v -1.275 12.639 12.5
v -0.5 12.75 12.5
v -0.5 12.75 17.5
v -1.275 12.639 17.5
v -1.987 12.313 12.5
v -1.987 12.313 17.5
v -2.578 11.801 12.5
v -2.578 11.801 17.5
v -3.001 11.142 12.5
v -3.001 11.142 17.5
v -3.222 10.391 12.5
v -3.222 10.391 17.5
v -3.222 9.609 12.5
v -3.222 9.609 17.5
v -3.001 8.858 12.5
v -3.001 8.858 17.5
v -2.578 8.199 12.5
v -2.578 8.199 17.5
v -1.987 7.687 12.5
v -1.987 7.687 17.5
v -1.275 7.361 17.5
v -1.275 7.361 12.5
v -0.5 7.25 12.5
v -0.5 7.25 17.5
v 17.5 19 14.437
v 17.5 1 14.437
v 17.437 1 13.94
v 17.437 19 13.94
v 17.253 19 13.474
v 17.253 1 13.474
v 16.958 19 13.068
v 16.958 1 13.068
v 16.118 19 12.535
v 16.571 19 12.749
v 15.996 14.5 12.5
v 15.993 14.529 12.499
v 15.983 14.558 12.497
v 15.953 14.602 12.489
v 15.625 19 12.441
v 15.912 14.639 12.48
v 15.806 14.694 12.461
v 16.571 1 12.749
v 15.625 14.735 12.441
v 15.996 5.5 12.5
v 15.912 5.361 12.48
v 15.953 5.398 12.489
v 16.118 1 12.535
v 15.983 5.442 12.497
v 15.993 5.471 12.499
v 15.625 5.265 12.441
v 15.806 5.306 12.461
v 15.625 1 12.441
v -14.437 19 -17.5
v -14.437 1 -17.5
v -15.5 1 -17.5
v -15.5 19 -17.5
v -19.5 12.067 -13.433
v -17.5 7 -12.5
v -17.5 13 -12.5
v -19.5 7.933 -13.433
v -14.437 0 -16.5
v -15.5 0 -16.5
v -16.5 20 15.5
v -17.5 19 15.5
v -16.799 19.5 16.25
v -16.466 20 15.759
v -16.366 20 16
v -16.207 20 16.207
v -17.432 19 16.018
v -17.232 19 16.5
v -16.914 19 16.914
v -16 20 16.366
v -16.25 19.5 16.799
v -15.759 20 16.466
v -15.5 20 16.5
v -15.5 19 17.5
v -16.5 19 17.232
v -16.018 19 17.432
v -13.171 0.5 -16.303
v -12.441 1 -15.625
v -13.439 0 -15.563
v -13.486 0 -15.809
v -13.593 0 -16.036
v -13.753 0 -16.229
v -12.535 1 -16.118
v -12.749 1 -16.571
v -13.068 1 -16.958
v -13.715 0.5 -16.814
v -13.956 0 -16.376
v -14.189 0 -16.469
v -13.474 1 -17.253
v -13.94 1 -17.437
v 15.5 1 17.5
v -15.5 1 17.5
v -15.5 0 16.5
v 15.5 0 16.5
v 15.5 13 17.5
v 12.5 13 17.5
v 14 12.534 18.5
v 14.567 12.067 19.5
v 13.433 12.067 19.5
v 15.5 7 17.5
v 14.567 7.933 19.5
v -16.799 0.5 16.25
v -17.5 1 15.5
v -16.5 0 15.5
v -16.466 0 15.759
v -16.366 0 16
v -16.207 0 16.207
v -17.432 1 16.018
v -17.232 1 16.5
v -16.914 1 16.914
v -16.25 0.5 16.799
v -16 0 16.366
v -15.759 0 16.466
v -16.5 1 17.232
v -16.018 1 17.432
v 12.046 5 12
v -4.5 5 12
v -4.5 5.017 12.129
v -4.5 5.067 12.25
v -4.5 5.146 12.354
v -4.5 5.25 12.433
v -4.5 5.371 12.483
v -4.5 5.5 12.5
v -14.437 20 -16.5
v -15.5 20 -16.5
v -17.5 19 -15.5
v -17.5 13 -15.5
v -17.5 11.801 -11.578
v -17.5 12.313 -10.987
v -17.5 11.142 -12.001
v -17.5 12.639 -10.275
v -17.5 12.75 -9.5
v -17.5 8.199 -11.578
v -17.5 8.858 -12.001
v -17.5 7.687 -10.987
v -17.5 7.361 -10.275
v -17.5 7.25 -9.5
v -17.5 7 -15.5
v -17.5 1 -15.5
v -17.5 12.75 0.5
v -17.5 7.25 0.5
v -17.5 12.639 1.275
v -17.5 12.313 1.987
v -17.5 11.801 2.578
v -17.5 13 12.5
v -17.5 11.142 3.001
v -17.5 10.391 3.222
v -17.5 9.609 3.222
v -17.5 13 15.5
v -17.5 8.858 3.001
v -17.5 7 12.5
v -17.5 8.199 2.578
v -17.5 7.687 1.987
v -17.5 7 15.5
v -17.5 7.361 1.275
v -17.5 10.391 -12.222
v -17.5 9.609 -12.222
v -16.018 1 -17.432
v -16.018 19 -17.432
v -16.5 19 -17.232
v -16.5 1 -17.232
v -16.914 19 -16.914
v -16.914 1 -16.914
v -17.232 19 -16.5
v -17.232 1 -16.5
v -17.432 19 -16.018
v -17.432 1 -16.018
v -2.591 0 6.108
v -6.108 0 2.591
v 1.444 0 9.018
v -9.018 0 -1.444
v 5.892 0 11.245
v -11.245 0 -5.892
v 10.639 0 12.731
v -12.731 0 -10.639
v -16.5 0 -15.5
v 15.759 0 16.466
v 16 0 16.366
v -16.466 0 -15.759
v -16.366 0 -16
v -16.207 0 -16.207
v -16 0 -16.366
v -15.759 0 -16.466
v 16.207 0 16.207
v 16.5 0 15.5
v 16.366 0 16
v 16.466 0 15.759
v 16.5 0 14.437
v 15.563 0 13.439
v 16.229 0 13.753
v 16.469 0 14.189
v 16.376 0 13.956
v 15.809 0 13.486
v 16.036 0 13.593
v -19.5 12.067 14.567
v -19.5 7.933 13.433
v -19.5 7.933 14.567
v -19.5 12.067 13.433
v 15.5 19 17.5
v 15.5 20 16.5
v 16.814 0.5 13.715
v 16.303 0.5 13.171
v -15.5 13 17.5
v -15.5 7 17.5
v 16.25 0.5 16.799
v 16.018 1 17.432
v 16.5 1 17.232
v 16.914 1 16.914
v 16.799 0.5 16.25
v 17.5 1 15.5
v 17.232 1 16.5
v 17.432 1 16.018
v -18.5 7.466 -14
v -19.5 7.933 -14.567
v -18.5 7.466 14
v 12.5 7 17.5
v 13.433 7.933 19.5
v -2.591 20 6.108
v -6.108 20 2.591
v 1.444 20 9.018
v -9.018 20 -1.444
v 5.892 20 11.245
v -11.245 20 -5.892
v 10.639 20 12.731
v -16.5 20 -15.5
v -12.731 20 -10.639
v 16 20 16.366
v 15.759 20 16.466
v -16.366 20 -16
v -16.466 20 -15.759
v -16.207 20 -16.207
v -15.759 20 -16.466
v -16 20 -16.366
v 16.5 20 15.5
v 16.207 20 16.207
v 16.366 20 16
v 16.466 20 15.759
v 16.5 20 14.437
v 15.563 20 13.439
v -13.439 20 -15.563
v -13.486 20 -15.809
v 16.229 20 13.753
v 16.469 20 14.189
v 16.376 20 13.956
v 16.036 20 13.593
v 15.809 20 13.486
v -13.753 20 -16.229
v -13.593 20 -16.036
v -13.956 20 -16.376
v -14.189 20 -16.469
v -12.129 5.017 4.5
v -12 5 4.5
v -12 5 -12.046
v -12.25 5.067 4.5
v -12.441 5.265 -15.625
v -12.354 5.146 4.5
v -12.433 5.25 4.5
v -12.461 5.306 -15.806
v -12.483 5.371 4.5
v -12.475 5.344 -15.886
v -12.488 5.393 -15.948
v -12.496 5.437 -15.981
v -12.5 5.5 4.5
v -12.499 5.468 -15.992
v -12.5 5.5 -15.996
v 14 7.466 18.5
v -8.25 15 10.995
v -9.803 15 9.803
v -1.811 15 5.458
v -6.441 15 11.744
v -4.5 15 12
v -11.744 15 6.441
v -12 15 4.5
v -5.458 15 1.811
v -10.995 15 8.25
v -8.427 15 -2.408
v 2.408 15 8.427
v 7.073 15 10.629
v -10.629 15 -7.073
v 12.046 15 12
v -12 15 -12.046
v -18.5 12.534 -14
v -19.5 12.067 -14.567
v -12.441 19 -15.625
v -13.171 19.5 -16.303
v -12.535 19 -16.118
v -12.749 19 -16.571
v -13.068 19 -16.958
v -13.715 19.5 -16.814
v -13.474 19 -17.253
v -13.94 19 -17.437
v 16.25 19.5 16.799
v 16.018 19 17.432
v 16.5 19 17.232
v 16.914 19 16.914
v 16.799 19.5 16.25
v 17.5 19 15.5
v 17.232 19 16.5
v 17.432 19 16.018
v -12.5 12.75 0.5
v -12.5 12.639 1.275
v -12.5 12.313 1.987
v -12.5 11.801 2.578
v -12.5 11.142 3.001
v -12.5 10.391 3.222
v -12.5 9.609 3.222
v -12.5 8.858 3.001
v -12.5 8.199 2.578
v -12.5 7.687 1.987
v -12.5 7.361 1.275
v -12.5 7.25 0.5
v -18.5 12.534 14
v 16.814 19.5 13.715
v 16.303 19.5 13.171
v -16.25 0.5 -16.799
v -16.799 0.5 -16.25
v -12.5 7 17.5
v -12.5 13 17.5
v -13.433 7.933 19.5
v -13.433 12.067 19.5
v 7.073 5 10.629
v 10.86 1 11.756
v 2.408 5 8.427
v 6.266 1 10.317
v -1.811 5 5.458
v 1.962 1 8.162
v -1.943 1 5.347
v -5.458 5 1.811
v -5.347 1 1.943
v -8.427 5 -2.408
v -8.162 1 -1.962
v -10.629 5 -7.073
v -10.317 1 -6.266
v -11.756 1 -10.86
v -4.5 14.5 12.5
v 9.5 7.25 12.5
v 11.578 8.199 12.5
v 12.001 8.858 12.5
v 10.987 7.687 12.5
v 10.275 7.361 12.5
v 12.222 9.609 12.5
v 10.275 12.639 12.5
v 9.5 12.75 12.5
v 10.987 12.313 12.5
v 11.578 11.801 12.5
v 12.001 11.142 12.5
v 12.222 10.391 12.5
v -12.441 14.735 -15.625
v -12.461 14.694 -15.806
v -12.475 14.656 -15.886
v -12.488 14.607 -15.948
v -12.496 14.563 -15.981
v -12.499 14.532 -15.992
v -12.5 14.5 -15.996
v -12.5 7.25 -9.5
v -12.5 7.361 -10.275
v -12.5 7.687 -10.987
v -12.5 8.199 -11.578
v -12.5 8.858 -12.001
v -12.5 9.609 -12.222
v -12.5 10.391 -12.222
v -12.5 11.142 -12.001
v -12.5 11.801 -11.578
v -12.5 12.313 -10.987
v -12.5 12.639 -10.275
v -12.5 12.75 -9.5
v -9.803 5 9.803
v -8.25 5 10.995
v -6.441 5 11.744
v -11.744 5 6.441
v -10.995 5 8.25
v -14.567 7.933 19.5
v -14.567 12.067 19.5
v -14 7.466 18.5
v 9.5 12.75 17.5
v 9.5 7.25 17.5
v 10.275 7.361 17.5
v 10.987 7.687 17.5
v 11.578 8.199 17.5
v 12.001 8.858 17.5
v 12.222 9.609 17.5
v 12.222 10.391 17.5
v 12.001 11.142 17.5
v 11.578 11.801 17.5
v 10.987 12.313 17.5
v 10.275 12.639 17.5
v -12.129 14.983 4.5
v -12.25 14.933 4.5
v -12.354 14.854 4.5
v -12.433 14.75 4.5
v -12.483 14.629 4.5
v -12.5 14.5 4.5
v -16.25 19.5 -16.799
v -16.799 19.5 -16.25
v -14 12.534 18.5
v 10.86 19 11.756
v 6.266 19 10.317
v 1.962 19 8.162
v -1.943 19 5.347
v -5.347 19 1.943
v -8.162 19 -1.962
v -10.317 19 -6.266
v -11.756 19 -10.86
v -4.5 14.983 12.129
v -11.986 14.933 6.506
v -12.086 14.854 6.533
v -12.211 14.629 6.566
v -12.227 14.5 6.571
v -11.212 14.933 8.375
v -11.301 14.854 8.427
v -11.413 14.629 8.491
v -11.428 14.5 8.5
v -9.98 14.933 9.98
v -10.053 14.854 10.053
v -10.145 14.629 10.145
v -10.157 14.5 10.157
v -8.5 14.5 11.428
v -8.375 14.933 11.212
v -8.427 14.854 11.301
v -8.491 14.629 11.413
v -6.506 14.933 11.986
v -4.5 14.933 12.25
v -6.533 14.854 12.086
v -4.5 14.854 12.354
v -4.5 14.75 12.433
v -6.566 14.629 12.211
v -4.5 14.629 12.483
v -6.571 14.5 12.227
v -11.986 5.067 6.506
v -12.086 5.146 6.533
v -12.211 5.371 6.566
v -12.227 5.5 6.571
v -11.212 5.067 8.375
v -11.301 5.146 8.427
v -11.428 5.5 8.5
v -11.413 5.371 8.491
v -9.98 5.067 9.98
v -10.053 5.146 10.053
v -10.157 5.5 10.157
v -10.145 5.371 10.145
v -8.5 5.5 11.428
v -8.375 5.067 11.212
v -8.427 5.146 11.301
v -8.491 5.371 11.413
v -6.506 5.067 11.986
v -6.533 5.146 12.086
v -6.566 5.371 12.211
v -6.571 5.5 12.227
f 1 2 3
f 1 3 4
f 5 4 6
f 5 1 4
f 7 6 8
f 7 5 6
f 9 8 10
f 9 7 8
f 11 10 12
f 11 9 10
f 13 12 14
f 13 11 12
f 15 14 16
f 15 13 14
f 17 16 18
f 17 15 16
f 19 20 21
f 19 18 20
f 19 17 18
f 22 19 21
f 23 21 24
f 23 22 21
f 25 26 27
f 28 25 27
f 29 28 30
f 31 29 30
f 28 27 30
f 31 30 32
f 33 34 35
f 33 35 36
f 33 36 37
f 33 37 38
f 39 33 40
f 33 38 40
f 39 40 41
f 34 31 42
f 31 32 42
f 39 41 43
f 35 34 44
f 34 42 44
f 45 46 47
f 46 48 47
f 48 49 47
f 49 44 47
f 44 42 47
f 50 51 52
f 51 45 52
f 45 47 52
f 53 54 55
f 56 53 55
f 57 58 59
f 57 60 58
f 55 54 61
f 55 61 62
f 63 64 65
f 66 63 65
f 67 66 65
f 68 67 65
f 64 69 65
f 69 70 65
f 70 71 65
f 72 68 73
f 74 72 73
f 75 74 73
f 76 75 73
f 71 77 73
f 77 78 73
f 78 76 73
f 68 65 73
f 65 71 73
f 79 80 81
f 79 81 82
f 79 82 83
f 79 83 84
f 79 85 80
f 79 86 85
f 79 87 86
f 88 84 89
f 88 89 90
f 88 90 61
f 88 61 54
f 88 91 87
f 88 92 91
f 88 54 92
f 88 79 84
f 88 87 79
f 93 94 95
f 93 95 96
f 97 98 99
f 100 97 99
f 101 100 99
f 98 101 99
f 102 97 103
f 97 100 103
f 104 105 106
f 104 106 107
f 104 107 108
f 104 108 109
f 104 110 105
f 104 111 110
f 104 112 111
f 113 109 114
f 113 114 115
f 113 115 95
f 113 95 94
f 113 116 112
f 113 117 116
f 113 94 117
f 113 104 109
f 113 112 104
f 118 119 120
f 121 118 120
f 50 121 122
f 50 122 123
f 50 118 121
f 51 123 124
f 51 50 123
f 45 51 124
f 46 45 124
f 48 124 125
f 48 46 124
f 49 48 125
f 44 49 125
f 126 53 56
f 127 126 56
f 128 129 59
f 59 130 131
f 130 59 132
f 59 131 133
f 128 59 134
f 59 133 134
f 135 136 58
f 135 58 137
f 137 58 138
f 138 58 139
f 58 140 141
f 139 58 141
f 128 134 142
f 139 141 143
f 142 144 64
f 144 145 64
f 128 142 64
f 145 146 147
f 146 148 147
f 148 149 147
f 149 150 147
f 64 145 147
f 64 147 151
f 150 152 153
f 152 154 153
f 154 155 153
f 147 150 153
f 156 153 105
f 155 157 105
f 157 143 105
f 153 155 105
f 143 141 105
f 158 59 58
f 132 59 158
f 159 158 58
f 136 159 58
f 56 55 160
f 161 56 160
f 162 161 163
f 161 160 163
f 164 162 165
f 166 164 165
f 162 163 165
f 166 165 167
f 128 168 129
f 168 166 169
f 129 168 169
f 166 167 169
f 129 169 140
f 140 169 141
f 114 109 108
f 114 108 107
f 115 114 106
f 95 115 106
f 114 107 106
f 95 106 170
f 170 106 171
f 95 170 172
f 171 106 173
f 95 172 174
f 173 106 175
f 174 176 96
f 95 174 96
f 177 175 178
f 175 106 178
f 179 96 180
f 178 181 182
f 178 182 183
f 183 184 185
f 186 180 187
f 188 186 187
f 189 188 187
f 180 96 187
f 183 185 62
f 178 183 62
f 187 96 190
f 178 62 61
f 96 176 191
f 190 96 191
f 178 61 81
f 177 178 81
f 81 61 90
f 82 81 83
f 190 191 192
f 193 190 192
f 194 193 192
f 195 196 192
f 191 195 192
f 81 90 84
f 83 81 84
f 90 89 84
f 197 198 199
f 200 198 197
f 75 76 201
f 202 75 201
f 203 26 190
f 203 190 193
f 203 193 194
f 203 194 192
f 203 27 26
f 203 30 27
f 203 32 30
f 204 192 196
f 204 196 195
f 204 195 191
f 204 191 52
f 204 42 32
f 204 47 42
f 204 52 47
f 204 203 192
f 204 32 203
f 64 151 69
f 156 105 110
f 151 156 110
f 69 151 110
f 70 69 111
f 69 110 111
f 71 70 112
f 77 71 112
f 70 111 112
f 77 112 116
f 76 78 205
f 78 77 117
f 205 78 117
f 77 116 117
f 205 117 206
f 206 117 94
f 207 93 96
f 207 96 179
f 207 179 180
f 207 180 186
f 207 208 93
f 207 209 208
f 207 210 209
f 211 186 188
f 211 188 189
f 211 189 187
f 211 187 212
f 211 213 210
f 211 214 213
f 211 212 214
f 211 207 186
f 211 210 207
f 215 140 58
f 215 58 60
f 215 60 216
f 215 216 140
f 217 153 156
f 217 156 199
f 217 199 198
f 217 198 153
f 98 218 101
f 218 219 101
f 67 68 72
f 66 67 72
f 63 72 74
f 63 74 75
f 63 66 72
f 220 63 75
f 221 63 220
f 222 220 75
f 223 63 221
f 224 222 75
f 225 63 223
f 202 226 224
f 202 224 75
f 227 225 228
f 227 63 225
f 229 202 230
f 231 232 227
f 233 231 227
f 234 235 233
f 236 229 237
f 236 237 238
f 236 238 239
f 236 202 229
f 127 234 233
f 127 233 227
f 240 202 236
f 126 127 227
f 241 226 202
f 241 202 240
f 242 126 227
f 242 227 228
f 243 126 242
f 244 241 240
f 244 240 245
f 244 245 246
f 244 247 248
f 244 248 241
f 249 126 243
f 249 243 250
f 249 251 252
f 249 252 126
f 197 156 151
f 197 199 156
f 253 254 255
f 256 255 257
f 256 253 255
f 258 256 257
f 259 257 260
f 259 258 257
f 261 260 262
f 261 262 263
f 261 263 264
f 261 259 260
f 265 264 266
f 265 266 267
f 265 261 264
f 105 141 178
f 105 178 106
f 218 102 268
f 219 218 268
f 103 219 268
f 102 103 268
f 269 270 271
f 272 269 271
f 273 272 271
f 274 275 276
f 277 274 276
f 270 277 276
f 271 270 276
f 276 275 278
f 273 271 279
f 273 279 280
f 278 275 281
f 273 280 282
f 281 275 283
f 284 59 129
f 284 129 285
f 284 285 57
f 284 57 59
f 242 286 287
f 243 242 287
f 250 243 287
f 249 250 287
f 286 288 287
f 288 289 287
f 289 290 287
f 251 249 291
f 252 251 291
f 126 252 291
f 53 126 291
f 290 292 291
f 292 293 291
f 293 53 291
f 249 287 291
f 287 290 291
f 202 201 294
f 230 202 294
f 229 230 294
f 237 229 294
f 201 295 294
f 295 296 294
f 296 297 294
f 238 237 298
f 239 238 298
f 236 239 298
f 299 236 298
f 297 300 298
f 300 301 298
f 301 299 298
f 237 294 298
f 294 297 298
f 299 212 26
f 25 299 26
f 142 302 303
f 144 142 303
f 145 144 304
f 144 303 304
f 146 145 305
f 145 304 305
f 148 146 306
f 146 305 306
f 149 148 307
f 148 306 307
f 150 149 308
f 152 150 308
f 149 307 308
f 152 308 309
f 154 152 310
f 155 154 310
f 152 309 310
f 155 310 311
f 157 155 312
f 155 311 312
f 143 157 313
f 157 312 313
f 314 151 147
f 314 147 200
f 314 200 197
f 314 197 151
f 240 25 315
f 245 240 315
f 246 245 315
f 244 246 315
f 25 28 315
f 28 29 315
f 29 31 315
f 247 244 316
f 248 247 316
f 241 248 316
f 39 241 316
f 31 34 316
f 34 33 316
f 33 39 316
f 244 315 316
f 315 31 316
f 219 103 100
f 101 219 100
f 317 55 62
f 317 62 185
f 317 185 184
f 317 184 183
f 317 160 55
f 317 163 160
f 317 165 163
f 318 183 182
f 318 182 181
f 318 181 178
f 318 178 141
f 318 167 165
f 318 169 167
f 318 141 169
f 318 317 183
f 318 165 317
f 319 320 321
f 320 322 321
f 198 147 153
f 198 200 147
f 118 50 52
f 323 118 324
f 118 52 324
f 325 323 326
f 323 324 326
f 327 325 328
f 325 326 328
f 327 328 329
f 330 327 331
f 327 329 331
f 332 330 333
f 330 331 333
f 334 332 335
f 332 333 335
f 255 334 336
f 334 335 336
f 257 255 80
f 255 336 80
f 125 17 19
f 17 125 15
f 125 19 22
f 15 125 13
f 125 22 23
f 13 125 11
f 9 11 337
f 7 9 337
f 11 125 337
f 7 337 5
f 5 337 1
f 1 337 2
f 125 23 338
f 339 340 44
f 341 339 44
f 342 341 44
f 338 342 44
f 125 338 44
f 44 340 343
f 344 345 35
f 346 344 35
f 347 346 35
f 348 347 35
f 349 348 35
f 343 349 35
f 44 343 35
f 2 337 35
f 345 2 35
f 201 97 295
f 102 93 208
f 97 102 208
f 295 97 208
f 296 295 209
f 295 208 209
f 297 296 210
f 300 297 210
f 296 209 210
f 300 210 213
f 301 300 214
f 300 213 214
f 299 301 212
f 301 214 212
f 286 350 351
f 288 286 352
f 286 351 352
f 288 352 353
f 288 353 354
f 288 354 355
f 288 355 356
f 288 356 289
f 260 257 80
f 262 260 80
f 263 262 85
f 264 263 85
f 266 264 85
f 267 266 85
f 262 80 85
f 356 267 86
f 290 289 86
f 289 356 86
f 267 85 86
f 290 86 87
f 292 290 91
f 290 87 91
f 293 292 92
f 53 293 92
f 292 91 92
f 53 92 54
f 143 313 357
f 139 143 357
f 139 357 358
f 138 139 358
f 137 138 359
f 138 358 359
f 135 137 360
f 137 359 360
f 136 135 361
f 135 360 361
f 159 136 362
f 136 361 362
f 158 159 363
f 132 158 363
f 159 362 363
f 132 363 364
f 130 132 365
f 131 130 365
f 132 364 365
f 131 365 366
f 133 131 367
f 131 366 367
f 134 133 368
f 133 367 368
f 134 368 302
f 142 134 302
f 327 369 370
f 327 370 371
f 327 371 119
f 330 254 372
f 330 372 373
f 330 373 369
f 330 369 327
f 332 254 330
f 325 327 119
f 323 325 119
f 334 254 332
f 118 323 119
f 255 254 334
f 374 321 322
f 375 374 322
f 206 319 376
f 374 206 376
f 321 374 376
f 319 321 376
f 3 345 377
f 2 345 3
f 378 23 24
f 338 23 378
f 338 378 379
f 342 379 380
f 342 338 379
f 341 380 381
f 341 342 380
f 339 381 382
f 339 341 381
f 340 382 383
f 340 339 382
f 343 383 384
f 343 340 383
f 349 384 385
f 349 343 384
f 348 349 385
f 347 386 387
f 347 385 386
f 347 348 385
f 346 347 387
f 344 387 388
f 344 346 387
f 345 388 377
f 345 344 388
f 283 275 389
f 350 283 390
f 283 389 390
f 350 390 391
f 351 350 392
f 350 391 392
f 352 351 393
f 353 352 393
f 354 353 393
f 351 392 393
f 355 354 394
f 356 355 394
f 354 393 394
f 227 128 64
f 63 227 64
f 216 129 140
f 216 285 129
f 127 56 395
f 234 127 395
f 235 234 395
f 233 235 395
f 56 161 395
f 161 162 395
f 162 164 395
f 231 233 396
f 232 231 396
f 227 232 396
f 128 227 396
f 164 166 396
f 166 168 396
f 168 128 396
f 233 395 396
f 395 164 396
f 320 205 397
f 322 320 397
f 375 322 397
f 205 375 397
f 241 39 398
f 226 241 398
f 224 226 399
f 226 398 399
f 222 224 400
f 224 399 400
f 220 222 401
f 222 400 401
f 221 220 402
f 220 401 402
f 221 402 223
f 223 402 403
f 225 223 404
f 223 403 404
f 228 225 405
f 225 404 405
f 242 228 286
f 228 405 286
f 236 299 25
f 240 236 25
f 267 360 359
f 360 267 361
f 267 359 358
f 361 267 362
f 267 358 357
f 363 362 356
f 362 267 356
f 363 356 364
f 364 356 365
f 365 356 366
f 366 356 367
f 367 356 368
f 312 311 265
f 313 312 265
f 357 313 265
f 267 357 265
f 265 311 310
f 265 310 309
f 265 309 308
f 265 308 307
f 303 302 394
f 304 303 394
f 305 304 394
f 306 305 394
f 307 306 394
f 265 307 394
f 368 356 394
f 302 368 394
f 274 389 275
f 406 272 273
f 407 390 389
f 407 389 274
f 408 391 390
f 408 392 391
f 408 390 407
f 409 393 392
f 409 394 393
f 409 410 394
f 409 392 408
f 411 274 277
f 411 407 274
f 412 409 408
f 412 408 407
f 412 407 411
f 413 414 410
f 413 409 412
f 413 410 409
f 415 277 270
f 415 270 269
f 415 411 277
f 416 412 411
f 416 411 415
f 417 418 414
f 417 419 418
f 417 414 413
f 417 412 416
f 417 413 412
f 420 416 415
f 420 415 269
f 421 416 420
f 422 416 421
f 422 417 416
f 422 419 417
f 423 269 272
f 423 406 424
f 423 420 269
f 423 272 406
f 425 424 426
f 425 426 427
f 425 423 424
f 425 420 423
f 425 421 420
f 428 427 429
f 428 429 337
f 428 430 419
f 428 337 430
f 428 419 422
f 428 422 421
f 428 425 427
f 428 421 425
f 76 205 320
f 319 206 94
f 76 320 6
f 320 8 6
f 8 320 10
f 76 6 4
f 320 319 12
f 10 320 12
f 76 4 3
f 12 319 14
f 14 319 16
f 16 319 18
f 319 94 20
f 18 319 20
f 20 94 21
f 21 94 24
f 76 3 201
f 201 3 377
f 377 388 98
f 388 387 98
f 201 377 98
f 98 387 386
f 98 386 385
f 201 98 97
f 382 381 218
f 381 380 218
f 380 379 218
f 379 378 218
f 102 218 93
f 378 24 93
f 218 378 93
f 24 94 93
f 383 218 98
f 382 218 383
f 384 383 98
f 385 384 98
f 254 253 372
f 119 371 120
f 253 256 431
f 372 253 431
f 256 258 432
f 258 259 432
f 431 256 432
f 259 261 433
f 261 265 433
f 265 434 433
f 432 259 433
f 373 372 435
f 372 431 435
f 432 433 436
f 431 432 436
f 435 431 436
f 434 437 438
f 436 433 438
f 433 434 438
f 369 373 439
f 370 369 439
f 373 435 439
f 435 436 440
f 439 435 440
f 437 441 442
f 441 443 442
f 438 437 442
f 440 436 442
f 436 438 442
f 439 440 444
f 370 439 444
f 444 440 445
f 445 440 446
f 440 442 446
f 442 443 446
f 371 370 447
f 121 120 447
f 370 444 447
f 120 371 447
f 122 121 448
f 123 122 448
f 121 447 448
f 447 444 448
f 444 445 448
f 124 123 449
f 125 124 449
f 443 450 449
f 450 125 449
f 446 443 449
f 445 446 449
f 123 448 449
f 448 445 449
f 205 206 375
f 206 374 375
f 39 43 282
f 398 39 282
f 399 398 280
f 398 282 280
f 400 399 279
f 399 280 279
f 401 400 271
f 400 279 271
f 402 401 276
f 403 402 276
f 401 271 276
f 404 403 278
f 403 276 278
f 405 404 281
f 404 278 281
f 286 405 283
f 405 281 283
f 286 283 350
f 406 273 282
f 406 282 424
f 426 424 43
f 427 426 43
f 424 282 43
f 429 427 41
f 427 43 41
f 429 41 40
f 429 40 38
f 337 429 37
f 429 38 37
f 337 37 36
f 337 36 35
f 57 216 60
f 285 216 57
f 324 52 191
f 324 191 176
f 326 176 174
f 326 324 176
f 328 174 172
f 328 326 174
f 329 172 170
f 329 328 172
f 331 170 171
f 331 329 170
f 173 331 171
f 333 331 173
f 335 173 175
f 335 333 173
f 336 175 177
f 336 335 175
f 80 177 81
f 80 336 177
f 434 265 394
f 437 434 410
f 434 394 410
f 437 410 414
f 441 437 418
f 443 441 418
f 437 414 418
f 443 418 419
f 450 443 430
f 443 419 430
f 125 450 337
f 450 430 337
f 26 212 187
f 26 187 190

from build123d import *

# Parameters (mm, degrees)
BOSS_EXTRUDE1_DEPTH = 20
CUT_EXTRUDE2_START  = -10
CUT_EXTRUDE2_DEPTH  = 5
CUT_EXTRUDE1_START  = -36
CUT_EXTRUDE1_DEPTH  = 37
SKETCH5_W           = 3
SKETCH5_H           = 6
BOSS_EXTRUDE2_DEPTH = 2
BOSS_EXTRUDE2_TAPER = 25
FILLET1_R           = 8
CHAMFER2_SIZE       = 1
FILLET2_R           = 0.5


with BuildPart() as part:
    # Sketch1 → Boss-Extrude1 (new body)
    with BuildSketch(Plane(origin=(0, 0, 0), x_dir=(1, 0, 0), z_dir=(0, 1, 0))):
        with BuildLine():
            Line((-17.5, 15.5), (-17.5, -15.5))
            ThreePointArc((-17.5, -15.5), (-16.914213562, -16.914213562), (-15.5, -17.5))
            Line((-15.5, -17.5), (15.5, -17.5))
            ThreePointArc((15.5, -17.5), (16.914213562, -16.914213562), (17.5, -15.5))
            Line((17.5, -15.5), (17.5, -14.437438845))
            ThreePointArc((17.5, -14.437438845), (16.957737974, -13.068132452), (15.625, -12.441348918))
            ThreePointArc((15.625, -12.441348918), (-3.713203436, -3.713203436), (-12.441348918, 15.625))
            ThreePointArc((-12.441348918, 15.625), (-13.068132452, 16.957737974), (-14.437438845, 17.5))
            Line((-14.437438845, 17.5), (-15.5, 17.5))
            ThreePointArc((-15.5, 17.5), (-16.914213562, 16.914213562), (-17.5, 15.5))
        make_face()
    extrude(amount=BOSS_EXTRUDE1_DEPTH)

    # Sketch3 → Cut-Extrude2 (cut, symmetric)
    with BuildSketch(Plane(origin=(0, 20, 0), x_dir=(1, 0, 0), z_dir=(0, 1, 0)).offset(CUT_EXTRUDE2_START)):
        Polygon((-12.5, 33.240018262), (-12.5, -12.5), (41.305309001, -12.5), align=None)
    extrude(amount=CUT_EXTRUDE2_DEPTH, both=True, mode=Mode.SUBTRACT)

    # Sketch2 → Cut-Extrude1 (cut)
    with BuildSketch(Plane.ZY.offset(17.5).offset(CUT_EXTRUDE1_START)):
        with BuildLine():
            Line((-9.5, 12.75), (0.5, 12.75))
            ThreePointArc((0.5, 12.75), (3.25, 10), (0.5, 7.25))
            Line((0.5, 7.25), (-9.5, 7.25))
            ThreePointArc((-9.5, 7.25), (-12.25, 10), (-9.5, 12.75))
        make_face()
    cut_extrude1 = extrude(amount=CUT_EXTRUDE1_DEPTH, mode=Mode.SUBTRACT)

    # Sketch5 → Boss-Extrude2 (add)
    with BuildSketch(Plane.ZY.offset(17.5)):
        with Locations((-14, 10)):
            Rectangle(SKETCH5_W, SKETCH5_H)
        with Locations((14, 10)):
            Rectangle(SKETCH5_W, SKETCH5_H)
    boss_extrude2 = extrude(amount=BOSS_EXTRUDE2_DEPTH, taper=BOSS_EXTRUDE2_TAPER)

    # Mirror1: Cut-Extrude1, Boss-Extrude2 across plane
    add(cut_extrude1.mirror(Plane(origin=(0, 0, 0), x_dir=(-0.707106781, 0, 0.707106781), z_dir=(0.707106781, 0, 0.707106781))), mode=Mode.SUBTRACT)
    add(boss_extrude2.mirror(Plane(origin=(0, 0, 0), x_dir=(-0.707106781, 0, 0.707106781), z_dir=(0.707106781, 0, 0.707106781))))

    # Fillet1
    fillet1_edges = [part.edges().sort_by_distance(p)[0] for p in [
        (-12.5, 10, 12.5),
    ]]
    fillet(fillet1_edges, radius=FILLET1_R)

    # Chamfer2
    chamfer2_edges = [part.edges().sort_by_distance(p)[0] for p in [
        (-14.968719423, 0, -17.5),
        (-13.068132452, 0, -16.957737974),
        (-3.713203436, 0, 3.713203436),
        (16.957737974, 0, 13.068132452),
        (17.5, 0, 14.968719423),
        (16.914213562, 0, 16.914213562),
        (0, 0, 17.5),
        (-16.914213562, 20, 16.914213562),
        (-16.914213562, 0, 16.914213562),
        (-17.5, 0, 0),
        (-16.914213562, 0, -16.914213562),
        (0, 20, 17.5),
        (16.914213562, 20, 16.914213562),
        (17.5, 20, 14.968719423),
        (16.957737974, 20, 13.068132452),
        (-3.713203436, 20, 3.713203436),
        (-13.068132452, 20, -16.957737974),
        (-14.968719423, 20, -17.5),
        (-16.914213562, 20, -16.914213562),
        (-17.5, 20, 0),
    ]]
    chamfer(chamfer2_edges, length=CHAMFER2_SIZE)

    # Fillet2
    fillet2_edges = [part.edges().sort_by_distance(p)[0] for p in [
        (5.748158579, 5, 12.5),
        (-10.156854249, 5, 10.156854249),
        (5.748158579, 15, 12.5),
        (-10.156854249, 15, 10.156854249),
        (-12.5, 5, -5.748158579),
        (-12.5, 15, -5.748158579),
    ]]
    fillet(fillet2_edges, radius=FILLET2_R)


solid = part.part
